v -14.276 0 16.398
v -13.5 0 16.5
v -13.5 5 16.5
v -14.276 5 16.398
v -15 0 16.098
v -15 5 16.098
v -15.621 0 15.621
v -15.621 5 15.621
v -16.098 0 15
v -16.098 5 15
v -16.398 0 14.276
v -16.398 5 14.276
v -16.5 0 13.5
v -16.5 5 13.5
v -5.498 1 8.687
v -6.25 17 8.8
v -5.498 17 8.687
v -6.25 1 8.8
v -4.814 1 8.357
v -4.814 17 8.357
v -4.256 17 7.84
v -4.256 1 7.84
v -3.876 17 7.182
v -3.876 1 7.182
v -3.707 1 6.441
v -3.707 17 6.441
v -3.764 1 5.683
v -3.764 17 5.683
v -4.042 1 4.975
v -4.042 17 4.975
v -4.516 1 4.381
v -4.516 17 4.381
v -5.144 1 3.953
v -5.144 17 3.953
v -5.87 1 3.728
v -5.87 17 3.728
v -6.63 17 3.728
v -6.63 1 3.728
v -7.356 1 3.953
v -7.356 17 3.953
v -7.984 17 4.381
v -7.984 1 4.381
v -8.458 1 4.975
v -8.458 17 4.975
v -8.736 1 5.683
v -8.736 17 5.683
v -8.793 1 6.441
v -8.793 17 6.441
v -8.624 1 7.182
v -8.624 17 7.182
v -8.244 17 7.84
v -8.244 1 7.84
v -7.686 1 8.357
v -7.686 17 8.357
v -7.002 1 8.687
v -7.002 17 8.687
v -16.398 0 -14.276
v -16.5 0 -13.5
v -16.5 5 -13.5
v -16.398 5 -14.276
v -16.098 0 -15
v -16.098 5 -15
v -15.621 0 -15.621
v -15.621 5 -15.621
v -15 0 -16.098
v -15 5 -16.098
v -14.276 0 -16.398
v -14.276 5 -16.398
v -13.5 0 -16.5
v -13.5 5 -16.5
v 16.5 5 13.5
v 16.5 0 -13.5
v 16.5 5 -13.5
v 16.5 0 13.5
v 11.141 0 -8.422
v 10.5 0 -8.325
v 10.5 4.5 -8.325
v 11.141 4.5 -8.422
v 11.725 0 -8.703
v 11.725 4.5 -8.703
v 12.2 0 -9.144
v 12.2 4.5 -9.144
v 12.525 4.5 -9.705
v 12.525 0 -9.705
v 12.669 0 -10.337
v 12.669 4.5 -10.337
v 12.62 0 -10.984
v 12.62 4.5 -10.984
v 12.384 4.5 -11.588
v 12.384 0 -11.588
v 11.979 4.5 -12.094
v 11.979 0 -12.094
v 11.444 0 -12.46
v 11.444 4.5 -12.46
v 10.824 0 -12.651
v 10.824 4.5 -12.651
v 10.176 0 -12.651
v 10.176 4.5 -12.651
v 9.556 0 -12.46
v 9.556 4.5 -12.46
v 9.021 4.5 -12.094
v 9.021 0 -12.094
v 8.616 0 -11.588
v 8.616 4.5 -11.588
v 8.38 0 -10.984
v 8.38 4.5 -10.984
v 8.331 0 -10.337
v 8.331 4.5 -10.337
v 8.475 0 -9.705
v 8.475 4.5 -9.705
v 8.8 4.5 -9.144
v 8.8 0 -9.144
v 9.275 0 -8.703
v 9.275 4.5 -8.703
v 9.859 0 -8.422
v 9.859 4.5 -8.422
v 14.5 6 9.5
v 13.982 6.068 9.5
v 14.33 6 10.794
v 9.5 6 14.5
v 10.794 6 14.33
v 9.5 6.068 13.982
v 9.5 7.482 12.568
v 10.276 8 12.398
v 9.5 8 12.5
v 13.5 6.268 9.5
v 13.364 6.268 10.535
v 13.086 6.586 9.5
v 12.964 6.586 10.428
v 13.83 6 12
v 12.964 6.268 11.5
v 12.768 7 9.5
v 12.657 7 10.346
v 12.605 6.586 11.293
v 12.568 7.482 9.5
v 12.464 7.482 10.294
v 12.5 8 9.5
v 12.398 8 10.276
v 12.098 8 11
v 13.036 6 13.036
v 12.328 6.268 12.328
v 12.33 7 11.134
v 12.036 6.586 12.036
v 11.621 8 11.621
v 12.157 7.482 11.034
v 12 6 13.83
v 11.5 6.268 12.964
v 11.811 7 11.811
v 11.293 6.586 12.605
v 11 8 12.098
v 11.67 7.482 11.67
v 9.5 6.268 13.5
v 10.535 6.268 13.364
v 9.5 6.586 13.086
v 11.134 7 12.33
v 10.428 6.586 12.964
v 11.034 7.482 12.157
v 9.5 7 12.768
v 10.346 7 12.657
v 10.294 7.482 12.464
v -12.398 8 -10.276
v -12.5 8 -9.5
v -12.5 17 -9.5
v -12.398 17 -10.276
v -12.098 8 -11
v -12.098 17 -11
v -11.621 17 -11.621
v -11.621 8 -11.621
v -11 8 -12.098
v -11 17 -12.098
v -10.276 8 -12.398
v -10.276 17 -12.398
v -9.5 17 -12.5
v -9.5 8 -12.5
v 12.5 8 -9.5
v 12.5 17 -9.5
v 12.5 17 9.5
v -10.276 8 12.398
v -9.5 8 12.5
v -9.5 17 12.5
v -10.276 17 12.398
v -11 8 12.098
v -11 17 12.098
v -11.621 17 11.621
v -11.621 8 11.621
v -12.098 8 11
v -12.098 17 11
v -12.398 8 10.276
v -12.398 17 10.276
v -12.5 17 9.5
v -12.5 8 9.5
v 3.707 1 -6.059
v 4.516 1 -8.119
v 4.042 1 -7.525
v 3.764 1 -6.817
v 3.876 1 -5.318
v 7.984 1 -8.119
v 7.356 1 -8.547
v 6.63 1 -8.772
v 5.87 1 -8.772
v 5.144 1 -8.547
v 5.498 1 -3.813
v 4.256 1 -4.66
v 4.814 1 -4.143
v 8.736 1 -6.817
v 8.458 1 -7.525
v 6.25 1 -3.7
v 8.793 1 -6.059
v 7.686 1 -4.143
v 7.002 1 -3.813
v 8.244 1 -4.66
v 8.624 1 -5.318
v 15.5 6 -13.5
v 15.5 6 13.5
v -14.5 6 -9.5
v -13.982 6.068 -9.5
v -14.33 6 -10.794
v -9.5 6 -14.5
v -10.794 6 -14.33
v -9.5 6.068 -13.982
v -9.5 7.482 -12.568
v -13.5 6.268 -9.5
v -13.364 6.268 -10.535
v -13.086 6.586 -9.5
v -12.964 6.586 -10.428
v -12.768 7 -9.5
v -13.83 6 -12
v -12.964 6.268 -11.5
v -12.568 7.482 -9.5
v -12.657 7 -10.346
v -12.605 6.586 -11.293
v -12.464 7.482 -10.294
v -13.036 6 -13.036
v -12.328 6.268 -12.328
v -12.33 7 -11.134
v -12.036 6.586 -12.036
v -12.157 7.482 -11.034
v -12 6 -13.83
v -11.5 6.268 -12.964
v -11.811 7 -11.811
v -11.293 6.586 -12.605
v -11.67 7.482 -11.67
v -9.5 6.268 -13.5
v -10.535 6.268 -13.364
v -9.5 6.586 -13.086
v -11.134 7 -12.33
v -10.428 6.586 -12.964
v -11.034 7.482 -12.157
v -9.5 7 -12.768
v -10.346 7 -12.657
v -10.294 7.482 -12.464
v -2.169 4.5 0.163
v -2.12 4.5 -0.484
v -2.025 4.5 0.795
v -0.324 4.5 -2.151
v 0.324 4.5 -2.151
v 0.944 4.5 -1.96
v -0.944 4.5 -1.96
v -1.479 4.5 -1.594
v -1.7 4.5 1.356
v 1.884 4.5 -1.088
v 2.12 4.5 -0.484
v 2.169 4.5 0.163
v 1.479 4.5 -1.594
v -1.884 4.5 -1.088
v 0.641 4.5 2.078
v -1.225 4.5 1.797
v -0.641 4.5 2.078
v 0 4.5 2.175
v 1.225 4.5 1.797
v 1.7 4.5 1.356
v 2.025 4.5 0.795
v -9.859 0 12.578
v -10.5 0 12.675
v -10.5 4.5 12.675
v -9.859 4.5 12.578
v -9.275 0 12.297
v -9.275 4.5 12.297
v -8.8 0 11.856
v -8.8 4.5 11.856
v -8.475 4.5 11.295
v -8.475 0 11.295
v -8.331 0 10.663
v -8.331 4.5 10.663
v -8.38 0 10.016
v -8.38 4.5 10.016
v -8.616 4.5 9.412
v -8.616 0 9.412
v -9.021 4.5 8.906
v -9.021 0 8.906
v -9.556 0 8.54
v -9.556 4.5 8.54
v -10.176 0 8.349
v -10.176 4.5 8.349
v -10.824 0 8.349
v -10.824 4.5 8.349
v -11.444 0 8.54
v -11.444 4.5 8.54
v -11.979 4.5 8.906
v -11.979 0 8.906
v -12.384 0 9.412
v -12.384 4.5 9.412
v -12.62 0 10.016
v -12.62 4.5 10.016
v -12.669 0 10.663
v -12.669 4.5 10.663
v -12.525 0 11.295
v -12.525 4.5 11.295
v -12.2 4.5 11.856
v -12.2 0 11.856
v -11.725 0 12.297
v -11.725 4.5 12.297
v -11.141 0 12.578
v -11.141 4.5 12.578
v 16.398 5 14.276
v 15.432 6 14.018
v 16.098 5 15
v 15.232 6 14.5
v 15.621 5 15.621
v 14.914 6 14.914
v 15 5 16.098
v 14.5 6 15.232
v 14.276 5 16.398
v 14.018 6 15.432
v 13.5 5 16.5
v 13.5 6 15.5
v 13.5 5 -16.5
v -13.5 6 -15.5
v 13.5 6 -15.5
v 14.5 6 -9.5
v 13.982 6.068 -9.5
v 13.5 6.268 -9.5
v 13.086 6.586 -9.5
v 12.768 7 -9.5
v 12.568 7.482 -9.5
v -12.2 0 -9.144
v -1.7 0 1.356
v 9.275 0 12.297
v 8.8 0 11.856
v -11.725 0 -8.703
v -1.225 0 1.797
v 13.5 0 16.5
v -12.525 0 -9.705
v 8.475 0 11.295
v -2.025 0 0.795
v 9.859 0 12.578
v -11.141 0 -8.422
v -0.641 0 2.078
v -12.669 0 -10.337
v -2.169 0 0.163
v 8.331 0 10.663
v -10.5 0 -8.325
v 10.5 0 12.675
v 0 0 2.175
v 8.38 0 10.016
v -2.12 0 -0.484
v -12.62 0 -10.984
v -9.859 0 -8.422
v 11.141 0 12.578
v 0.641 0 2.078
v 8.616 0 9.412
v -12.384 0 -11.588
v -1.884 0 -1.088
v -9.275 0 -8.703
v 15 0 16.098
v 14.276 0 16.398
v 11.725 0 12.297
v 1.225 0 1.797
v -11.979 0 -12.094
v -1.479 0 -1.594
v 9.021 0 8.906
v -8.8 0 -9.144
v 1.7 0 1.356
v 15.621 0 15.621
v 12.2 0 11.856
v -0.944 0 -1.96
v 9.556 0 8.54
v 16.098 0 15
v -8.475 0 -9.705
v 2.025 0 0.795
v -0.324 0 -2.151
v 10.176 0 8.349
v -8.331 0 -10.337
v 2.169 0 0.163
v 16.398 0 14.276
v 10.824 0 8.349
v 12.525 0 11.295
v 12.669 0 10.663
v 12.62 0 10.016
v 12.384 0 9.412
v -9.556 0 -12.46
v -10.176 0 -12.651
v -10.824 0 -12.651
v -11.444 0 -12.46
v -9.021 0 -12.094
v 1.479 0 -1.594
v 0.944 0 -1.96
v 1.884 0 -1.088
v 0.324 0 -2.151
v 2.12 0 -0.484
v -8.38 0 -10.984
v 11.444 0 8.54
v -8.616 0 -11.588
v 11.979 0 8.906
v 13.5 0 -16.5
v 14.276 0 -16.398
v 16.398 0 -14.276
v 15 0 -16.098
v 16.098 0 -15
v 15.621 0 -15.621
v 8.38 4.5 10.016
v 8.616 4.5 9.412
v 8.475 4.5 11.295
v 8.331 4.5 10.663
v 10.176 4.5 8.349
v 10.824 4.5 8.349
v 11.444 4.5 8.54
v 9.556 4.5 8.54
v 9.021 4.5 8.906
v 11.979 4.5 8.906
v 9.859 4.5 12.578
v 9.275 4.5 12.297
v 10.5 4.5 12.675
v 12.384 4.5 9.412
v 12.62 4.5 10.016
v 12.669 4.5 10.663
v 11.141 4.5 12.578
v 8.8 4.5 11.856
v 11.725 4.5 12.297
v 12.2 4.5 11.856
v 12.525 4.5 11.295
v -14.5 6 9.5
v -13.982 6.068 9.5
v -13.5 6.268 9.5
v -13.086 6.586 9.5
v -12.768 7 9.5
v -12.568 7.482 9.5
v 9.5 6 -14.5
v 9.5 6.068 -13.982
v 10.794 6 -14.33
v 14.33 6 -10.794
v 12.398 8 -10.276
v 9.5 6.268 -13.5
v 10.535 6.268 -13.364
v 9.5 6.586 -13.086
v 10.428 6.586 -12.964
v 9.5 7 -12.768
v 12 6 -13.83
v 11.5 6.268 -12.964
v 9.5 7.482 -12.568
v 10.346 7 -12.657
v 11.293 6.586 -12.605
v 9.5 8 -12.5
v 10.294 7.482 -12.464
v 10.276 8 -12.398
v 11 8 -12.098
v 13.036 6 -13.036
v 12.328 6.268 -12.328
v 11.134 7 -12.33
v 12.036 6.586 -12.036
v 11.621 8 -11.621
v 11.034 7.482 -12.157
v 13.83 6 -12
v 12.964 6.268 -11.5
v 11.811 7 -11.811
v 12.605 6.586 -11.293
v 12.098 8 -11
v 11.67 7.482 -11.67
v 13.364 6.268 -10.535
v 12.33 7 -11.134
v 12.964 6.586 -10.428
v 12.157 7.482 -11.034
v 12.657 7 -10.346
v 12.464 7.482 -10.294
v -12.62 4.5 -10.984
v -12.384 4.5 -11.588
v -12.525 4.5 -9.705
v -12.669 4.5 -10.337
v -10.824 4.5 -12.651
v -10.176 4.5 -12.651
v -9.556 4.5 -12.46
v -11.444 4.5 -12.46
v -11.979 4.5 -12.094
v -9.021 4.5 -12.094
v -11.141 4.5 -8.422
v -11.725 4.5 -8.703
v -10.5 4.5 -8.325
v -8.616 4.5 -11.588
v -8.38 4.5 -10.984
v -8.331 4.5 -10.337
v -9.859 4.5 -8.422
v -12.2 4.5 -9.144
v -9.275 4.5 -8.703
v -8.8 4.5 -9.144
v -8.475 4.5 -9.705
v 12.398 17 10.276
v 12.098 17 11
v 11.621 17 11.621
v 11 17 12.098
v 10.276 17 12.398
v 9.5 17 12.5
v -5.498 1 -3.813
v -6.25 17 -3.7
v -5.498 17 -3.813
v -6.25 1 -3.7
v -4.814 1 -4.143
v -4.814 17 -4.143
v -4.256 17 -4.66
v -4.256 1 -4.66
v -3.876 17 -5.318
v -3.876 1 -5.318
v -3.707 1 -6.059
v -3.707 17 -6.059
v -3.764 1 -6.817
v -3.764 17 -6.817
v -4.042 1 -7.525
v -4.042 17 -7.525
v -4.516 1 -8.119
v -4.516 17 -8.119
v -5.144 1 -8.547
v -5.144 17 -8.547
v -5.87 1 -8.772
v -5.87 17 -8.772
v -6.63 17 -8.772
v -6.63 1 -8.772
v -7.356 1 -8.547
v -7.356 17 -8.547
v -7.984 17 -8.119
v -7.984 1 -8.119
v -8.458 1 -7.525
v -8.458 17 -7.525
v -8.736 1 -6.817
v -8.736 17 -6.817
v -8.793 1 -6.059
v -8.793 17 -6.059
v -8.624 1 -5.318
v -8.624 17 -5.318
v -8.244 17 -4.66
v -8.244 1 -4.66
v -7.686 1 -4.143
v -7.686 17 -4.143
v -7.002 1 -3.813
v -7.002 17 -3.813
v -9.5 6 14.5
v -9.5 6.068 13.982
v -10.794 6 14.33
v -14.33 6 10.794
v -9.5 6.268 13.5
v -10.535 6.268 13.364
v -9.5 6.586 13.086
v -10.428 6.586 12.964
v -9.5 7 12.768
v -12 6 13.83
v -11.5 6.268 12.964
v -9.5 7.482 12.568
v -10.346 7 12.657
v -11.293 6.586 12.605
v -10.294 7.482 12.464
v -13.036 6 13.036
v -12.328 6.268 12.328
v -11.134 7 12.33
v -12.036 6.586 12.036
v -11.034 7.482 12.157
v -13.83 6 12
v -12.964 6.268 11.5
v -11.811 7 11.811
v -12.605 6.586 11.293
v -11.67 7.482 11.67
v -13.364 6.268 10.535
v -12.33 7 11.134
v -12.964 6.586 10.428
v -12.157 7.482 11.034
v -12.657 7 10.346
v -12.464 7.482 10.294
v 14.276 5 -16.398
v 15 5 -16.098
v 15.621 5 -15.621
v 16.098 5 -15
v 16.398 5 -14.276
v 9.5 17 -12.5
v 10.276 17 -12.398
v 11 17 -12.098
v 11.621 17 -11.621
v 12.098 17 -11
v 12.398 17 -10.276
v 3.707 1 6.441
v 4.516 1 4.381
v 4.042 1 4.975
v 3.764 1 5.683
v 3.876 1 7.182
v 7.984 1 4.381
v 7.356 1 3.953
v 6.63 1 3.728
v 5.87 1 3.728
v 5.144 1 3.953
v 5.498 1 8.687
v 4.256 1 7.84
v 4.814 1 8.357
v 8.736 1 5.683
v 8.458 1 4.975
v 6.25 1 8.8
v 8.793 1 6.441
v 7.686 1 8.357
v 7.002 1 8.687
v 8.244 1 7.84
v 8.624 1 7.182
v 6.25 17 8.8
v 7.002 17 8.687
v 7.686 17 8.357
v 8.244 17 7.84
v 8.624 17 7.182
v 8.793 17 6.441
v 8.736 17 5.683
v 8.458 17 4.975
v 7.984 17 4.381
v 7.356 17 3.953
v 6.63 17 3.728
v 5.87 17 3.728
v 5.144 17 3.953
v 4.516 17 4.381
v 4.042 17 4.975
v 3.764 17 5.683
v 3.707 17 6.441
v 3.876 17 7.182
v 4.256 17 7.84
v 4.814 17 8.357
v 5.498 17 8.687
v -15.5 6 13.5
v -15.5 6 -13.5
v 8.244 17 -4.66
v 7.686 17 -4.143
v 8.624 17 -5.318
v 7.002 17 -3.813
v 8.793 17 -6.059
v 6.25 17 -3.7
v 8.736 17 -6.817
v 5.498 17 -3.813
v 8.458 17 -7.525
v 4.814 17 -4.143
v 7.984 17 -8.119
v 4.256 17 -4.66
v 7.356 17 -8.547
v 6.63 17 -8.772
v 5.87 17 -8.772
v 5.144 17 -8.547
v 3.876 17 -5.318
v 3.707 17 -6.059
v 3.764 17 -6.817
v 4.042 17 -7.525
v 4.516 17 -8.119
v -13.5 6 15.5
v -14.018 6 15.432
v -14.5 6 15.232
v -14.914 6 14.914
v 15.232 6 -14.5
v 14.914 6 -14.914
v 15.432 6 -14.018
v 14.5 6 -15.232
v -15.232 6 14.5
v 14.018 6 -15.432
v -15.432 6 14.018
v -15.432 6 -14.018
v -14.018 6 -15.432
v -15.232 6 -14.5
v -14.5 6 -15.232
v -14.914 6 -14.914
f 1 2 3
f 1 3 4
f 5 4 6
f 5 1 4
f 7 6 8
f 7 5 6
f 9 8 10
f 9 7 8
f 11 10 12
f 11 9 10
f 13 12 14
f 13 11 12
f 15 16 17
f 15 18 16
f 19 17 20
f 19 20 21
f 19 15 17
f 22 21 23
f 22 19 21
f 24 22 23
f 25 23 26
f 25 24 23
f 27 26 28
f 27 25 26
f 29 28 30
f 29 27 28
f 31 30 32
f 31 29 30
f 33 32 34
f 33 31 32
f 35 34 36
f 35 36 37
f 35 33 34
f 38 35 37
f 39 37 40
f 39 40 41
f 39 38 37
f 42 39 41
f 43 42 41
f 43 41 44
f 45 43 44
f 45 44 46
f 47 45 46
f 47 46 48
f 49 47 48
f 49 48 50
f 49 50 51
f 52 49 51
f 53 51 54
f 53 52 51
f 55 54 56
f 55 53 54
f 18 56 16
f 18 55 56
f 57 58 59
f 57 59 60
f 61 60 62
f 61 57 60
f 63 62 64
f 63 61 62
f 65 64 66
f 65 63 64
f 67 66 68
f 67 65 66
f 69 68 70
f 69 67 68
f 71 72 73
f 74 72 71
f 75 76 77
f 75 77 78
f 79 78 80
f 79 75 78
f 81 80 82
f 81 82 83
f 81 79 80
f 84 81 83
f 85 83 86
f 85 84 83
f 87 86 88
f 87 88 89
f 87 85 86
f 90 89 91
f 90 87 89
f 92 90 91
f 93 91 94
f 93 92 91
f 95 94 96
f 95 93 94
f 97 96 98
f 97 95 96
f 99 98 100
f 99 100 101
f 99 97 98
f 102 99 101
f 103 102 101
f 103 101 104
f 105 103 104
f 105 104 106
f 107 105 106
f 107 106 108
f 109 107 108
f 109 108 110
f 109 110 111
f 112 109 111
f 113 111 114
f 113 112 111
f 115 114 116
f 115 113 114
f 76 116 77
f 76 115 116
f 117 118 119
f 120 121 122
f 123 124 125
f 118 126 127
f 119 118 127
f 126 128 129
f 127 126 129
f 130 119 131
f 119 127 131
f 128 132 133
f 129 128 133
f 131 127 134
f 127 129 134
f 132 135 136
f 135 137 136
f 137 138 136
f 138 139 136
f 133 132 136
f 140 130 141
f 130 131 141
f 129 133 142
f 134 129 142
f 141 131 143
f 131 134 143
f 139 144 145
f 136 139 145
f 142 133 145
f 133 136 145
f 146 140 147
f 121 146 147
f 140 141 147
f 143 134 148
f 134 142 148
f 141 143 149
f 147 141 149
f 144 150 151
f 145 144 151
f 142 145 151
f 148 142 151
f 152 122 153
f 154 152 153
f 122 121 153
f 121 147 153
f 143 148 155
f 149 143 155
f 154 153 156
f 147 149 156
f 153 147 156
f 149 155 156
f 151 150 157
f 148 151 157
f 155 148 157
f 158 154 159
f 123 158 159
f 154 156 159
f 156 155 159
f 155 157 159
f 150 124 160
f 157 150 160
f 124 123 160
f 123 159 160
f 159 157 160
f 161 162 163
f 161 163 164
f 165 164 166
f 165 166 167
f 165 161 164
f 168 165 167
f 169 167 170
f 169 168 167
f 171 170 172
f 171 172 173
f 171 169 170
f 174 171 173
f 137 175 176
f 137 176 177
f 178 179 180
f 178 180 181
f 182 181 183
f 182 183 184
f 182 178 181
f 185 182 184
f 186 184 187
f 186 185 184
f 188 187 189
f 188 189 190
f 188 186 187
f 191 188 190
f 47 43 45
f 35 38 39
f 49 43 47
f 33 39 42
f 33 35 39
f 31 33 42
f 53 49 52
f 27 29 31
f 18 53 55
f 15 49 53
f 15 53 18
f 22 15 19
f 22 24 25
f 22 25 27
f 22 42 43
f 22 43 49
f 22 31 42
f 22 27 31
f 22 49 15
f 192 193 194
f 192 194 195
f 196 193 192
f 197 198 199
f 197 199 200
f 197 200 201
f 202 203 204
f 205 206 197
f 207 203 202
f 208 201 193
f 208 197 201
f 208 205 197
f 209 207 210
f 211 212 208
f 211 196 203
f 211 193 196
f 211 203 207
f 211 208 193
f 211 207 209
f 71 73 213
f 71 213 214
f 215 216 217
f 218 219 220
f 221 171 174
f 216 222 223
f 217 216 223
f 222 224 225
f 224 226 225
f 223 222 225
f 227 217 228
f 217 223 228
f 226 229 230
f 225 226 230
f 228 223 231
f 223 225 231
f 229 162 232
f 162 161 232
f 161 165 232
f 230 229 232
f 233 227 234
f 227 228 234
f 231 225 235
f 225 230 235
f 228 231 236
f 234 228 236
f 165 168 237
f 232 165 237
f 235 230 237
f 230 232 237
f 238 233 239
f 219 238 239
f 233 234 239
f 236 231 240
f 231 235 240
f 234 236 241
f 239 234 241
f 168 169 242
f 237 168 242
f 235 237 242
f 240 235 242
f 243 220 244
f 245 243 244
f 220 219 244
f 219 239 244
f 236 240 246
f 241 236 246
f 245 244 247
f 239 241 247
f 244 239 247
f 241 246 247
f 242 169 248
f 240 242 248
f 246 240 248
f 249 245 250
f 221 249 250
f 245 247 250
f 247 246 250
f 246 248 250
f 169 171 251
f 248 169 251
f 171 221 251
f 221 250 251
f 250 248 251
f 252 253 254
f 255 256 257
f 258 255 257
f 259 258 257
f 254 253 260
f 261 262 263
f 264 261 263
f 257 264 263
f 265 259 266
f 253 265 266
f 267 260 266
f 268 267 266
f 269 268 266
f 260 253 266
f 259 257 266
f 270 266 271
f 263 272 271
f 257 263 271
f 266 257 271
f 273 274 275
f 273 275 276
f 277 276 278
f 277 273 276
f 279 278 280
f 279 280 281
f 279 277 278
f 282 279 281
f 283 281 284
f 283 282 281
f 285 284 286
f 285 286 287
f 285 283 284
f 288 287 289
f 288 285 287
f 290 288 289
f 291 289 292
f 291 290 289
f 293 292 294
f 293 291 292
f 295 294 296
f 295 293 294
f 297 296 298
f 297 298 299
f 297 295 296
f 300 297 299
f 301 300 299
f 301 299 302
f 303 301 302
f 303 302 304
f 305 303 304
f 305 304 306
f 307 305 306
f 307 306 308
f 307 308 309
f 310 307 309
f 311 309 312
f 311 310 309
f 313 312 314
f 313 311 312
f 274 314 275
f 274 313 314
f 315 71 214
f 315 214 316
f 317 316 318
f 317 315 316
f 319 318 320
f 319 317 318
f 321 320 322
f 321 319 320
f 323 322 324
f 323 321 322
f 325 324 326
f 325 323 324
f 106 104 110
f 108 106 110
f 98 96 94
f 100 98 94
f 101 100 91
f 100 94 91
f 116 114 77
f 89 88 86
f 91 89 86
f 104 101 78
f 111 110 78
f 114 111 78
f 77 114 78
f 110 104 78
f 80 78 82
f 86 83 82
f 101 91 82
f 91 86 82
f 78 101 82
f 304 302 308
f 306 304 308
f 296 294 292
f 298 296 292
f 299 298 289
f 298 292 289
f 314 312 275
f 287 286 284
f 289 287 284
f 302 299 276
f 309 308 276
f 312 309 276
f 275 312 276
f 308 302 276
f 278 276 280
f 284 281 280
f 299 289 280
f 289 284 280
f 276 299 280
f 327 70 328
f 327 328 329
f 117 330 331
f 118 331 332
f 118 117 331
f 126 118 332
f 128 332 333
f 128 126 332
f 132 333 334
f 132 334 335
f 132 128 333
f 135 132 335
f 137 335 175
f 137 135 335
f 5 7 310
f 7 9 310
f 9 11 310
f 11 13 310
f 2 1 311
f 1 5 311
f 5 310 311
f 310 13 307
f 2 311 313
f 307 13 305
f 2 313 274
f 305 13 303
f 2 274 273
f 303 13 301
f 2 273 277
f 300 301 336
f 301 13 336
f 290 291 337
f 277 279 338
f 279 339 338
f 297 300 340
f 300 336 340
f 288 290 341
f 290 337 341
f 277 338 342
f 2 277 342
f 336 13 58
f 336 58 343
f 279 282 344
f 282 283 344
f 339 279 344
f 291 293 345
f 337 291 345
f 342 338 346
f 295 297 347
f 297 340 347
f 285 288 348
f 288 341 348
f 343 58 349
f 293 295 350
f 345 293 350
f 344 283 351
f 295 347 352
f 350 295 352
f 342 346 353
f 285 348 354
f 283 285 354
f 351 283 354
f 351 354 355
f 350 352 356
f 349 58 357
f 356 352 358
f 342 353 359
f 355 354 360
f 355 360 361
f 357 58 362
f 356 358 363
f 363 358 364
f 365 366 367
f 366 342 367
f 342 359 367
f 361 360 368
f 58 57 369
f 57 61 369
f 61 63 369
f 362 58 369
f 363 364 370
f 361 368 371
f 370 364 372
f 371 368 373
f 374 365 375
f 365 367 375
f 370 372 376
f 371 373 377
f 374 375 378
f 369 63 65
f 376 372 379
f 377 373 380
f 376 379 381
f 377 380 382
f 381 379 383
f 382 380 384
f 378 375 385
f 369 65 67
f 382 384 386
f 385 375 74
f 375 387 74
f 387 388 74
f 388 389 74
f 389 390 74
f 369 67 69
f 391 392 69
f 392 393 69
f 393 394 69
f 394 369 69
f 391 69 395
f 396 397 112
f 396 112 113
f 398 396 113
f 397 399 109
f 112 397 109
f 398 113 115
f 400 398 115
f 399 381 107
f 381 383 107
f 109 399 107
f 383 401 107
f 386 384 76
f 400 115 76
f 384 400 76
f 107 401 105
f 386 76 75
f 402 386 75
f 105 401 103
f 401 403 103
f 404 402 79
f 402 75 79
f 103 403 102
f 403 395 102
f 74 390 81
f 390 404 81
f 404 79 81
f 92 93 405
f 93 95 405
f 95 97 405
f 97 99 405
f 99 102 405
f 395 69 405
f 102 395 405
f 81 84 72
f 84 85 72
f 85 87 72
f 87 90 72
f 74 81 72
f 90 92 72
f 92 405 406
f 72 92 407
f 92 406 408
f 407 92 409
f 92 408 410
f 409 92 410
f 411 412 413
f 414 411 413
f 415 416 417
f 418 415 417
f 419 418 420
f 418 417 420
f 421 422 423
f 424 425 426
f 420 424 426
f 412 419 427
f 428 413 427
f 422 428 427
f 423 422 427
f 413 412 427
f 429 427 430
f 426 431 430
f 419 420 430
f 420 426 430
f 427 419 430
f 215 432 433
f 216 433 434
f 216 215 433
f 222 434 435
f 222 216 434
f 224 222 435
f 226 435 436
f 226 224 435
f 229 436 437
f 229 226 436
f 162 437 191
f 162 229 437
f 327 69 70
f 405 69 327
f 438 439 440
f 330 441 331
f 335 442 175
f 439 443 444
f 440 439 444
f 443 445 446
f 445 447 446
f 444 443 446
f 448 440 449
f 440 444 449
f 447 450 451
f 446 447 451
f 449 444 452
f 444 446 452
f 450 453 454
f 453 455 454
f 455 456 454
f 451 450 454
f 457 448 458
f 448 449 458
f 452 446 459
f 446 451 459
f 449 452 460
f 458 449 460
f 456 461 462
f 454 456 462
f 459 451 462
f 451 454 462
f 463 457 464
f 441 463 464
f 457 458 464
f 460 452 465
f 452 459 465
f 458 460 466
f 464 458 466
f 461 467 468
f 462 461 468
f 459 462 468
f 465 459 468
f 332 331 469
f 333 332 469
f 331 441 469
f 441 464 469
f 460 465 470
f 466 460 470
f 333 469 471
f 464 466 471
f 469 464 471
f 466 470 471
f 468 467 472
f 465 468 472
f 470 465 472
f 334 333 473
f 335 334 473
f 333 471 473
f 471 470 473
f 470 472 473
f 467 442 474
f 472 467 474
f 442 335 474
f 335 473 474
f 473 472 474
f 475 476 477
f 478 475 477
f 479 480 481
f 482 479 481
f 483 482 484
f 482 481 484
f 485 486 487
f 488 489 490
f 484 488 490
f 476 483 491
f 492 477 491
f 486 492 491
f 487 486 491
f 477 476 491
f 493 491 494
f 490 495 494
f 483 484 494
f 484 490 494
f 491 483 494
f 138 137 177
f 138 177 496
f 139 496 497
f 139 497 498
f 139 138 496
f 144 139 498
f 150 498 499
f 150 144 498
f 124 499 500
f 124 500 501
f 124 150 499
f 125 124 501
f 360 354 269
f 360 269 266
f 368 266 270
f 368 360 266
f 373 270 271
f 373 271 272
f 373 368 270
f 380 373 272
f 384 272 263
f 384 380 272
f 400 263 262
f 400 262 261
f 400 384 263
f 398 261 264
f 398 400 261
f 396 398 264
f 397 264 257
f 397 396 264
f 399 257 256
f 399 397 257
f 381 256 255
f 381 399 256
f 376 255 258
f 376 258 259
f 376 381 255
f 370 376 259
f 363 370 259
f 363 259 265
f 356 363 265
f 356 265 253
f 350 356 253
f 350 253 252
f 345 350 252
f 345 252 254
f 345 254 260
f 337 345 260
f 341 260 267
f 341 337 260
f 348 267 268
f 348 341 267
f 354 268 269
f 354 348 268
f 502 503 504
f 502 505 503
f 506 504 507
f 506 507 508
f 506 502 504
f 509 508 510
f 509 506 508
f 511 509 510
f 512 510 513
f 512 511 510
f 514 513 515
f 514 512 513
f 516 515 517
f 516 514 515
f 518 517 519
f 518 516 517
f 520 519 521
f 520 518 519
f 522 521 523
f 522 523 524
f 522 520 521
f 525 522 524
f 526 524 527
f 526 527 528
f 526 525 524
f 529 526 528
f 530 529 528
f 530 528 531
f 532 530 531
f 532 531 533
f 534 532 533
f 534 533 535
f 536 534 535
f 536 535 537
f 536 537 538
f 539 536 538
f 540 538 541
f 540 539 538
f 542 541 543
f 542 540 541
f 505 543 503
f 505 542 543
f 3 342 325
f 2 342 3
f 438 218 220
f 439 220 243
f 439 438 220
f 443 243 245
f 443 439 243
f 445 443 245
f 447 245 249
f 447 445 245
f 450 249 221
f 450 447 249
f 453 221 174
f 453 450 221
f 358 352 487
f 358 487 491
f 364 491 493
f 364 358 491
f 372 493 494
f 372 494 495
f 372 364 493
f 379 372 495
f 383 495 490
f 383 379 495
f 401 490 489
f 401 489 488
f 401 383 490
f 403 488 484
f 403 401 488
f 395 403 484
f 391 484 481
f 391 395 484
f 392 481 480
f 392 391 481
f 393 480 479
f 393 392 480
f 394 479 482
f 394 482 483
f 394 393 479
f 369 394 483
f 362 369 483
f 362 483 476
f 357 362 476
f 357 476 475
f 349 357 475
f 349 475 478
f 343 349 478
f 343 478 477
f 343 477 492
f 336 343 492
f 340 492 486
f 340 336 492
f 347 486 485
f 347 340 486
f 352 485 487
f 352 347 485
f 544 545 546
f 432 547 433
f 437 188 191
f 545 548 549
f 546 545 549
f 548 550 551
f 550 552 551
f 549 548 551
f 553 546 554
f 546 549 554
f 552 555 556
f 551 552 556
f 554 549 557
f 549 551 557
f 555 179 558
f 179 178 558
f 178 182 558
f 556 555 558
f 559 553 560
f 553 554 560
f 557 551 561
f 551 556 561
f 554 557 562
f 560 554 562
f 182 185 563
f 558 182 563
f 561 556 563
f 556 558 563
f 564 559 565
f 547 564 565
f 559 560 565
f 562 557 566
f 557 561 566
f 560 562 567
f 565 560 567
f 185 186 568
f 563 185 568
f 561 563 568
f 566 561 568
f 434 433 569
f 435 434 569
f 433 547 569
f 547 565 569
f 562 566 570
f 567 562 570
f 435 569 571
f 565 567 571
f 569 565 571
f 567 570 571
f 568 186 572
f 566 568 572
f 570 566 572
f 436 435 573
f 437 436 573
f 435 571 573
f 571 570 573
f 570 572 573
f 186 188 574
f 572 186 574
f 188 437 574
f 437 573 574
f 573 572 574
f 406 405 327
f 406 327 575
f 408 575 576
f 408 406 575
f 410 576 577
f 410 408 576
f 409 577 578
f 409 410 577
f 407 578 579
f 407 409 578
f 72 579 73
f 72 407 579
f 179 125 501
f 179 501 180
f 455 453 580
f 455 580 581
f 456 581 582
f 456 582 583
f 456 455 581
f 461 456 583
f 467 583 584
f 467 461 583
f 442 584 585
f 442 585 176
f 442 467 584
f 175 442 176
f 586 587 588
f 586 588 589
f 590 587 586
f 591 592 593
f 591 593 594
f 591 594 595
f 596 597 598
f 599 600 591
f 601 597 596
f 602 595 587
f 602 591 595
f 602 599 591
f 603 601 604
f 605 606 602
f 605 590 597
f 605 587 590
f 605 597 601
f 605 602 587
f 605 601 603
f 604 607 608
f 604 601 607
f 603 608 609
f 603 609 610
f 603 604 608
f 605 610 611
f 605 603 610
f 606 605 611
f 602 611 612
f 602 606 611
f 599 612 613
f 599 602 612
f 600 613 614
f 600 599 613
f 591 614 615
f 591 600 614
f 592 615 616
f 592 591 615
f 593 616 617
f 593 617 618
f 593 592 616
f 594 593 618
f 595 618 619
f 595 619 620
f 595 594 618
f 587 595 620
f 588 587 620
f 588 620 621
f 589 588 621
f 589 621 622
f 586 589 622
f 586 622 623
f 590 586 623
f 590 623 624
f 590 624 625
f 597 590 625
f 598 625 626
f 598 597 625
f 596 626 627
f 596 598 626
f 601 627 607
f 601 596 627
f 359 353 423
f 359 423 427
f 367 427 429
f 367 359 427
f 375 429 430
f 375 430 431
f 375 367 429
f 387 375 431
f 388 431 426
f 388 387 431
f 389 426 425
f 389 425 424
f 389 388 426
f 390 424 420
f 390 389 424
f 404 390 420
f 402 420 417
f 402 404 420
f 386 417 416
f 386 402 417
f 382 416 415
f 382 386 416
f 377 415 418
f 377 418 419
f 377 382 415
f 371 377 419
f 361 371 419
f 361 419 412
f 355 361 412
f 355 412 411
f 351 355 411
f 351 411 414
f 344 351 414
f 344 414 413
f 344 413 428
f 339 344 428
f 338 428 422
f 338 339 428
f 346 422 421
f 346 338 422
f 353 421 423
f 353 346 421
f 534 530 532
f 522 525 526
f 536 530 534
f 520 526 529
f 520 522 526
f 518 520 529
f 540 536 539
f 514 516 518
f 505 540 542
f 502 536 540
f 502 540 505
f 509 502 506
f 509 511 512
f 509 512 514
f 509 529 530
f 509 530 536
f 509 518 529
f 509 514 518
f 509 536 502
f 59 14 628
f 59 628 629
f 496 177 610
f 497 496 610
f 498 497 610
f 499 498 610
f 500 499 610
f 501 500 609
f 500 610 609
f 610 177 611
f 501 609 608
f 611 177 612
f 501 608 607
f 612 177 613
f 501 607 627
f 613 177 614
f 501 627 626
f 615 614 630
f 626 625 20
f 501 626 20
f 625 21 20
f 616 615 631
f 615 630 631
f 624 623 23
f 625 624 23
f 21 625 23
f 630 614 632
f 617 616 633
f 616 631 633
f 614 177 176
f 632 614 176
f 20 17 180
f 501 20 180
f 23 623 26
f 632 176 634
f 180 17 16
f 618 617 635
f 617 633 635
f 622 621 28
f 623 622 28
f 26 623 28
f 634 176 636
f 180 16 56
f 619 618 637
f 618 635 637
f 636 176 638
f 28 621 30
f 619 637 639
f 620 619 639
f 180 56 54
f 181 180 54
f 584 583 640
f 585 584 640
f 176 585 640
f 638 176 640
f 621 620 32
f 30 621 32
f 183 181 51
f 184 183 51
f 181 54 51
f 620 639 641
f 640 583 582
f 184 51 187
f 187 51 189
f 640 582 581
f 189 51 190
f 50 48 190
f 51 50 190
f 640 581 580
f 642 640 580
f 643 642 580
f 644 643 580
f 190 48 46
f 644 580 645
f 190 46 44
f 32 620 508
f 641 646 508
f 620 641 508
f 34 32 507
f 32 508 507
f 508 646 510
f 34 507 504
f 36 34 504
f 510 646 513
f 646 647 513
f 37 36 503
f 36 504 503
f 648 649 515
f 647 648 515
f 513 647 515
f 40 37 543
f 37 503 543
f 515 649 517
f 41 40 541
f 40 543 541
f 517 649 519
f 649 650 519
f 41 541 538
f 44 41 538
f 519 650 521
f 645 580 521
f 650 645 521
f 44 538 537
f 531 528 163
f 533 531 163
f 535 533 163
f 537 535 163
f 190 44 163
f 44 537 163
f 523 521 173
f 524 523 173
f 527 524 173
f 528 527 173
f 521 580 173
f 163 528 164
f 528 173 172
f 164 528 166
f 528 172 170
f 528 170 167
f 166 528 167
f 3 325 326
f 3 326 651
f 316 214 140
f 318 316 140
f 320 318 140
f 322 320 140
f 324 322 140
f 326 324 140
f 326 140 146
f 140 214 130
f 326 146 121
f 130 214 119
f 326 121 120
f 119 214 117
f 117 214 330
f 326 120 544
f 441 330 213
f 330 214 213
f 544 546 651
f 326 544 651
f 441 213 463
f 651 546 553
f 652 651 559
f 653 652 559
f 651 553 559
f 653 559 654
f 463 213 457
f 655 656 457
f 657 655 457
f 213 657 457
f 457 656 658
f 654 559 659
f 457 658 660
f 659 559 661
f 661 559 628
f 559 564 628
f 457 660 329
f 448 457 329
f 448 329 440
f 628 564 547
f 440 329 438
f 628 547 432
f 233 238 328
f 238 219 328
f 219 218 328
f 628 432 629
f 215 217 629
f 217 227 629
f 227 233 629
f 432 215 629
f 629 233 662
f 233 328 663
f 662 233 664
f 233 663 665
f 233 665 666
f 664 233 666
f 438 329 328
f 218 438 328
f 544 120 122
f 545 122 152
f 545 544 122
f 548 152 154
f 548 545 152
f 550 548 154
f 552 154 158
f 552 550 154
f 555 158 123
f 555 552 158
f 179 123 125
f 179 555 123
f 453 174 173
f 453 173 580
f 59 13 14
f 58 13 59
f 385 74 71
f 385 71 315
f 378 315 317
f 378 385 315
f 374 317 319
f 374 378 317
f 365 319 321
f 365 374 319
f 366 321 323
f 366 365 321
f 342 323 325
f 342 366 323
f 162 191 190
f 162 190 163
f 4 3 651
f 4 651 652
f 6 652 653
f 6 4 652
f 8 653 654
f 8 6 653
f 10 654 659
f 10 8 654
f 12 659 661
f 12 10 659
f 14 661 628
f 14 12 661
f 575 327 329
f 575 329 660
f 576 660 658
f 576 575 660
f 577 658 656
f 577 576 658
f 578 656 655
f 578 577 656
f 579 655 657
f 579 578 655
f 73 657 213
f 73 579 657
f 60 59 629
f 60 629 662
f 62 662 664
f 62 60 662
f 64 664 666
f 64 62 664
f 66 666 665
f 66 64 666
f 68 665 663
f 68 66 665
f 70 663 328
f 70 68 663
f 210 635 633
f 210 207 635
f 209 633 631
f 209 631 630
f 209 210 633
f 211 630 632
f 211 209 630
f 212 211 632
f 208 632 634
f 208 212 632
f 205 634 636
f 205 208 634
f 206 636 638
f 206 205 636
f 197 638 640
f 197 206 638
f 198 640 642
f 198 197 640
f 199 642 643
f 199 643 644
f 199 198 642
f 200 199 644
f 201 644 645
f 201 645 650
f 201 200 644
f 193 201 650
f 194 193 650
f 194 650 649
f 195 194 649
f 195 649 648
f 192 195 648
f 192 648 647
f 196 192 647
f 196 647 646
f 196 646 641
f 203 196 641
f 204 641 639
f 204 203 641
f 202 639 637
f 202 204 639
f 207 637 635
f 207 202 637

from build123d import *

# Parameters (mm, degrees)
SKETCH_1_R          = 2.175
EXTRUDE_4_DEPTH     = 6
SKETCH_1_3_R        = 2.175
CUT_EXTRUDE_3_DEPTH = 4.5
SKETCH_8_R          = 2.55
EXTRUDE_5_DEPTH     = 11
FILLET_1_R          = 2
CUT_EXTRUDE_START   = -5
SKETCH_8_2_R        = 2.55
CUT_EXTRUDE_4_DEPTH = 5
CHAMFER_1_SIZE      = 1


with BuildPart() as part:
    # 草图1 → 凸台-拉伸4 (new body)
    # profile 1 of 6: a face of its own
    with BuildSketch(Plane(origin=(0, 0, 0), x_dir=(1, 0, 0), z_dir=(0, 1, 0))):
        with BuildLine():
            Line((-13.5, 16.5), (13.5, 16.5))
            ThreePointArc((13.5, 16.5), (15.621320344, 15.621320344), (16.5, 13.5))
            Line((16.5, 13.5), (16.5, -13.5))
            ThreePointArc((16.5, -13.5), (15.621320344, -15.621320344), (13.5, -16.5))
            Line((13.5, -16.5), (-13.5, -16.5))
            ThreePointArc((-13.5, -16.5), (-15.621320344, -15.621320344), (-16.5, -13.5))
            Line((-16.5, -13.5), (-16.5, 13.5))
            ThreePointArc((-16.5, 13.5), (-15.621320344, 15.621320344), (-13.5, 16.5))
        make_face()
        with Locations((-10.5, 10.5)):
            Circle(SKETCH_1_R, mode=Mode.SUBTRACT)
        with Locations((10.5, 10.5)):
            Circle(SKETCH_1_R, mode=Mode.SUBTRACT)
        with Locations((10.5, -10.5)):
            Circle(SKETCH_1_R, mode=Mode.SUBTRACT)
        with Locations((-10.5, -10.5)):
            Circle(SKETCH_1_R, mode=Mode.SUBTRACT)
        Circle(SKETCH_1_R, mode=Mode.SUBTRACT)
    # profile 2 of 6: a face of its own
    with BuildSketch(Plane(origin=(0, 0, 0), x_dir=(1, 0, 0), z_dir=(0, 1, 0))):
        with Locations((10.5, -10.5)):
            Circle(SKETCH_1_R)
    # profile 3 of 6: a face of its own
    with BuildSketch(Plane(origin=(0, 0, 0), x_dir=(1, 0, 0), z_dir=(0, 1, 0))):
        with Locations((10.5, 10.5)):
            Circle(SKETCH_1_R)
    # profile 4 of 6: a face of its own
    with BuildSketch(Plane(origin=(0, 0, 0), x_dir=(1, 0, 0), z_dir=(0, 1, 0))):
        with Locations((-10.5, 10.5)):
            Circle(SKETCH_1_R)
    # profile 5 of 6: a face of its own
    with BuildSketch(Plane(origin=(0, 0, 0), x_dir=(1, 0, 0), z_dir=(0, 1, 0))):
        Circle(SKETCH_1_R)
    # profile 6 of 6: a face of its own
    with BuildSketch(Plane(origin=(0, 0, 0), x_dir=(1, 0, 0), z_dir=(0, 1, 0))):
        with Locations((-10.5, -10.5)):
            Circle(SKETCH_1_R)
    extrude(amount=EXTRUDE_4_DEPTH)

    # 草图1<3> → 切除-拉伸3 (cut)
    with BuildSketch(Plane(origin=(0, 0, 0), x_dir=(1, 0, 0), z_dir=(0, 1, 0))):
        with Locations(Location((10.5, -10.5, 0), (0, 0, 270))):
            Circle(SKETCH_1_3_R)
        with Locations(Location((10.5, 10.5, 0), (0, 0, 270))):
            Circle(SKETCH_1_3_R)
        with Locations(Location((-10.5, 10.5, 0), (0, 0, 270))):
            Circle(SKETCH_1_3_R)
        with Locations(Location((-10.5, -10.5, 0), (0, 0, 270))):
            Circle(SKETCH_1_3_R)
        with Locations(Location((0, 0, 0), (0, 0, 270))):
            Circle(SKETCH_1_3_R)
    extrude(amount=CUT_EXTRUDE_3_DEPTH, mode=Mode.SUBTRACT)

    # 草图8 → 凸台-拉伸5 (add)
    with BuildSketch(Plane(origin=(0, 6, 0), x_dir=(1, 0, 0), z_dir=(0, 1, 0))):
        with BuildLine():
            Line((-9.5, 12.5), (9.5, 12.5))
            ThreePointArc((9.5, 12.5), (11.621320344, 11.621320344), (12.5, 9.5))
            Line((12.5, 9.5), (12.5, -9.5))
            ThreePointArc((12.5, -9.5), (11.621320344, -11.621320344), (9.5, -12.5))
            Line((9.5, -12.5), (-9.5, -12.5))
            ThreePointArc((-9.5, -12.5), (-11.621320344, -11.621320344), (-12.5, -9.5))
            Line((-12.5, -9.5), (-12.5, 9.5))
            ThreePointArc((-12.5, 9.5), (-11.621320344, 11.621320344), (-9.5, 12.5))
        make_face()
        with Locations(Location((-6.25, 6.25, 0), (0, 0, 270))):
            Circle(SKETCH_8_R, mode=Mode.SUBTRACT)
        with Locations(Location((6.25, 6.25, 0), (0, 0, 270))):
            Circle(SKETCH_8_R, mode=Mode.SUBTRACT)
        with Locations(Location((-6.25, -6.25, 0), (0, 0, 270))):
            Circle(SKETCH_8_R, mode=Mode.SUBTRACT)
        with Locations(Location((6.25, -6.25, 0), (0, 0, 270))):
            Circle(SKETCH_8_R, mode=Mode.SUBTRACT)
    extrude(amount=EXTRUDE_5_DEPTH)

    # 圆角1
    fillet_1_edges = [part.edges().sort_by_distance(p)[0] for p in [
        (11.621320344, 6, 11.621320344),
        (12.5, 6, 0),
        (11.621320344, 6, -11.621320344),
        (0, 6, -12.5),
        (-11.621320344, 6, -11.621320344),
        (-12.5, 6, 0),
        (-11.621320344, 6, 11.621320344),
        (0, 6, 12.5),
    ]]
    fillet(fillet_1_edges, radius=FILLET_1_R)

    # 草图8<2> → 切除-拉伸4 (cut)
    with BuildSketch(Plane(origin=(0, 6, 0), x_dir=(1, 0, 0), z_dir=(0, 1, 0)).offset(CUT_EXTRUDE_START)):
        with Locations(Location((-6.25, 6.25, 0), (0, 0, 270))):
            Circle(SKETCH_8_2_R)
        with Locations(Location((6.25, 6.25, 0), (0, 0, 270))):
            Circle(SKETCH_8_2_R)
        with Locations(Location((6.25, -6.25, 0), (0, 0, 270))):
            Circle(SKETCH_8_2_R)
        with Locations(Location((-6.25, -6.25, 0), (0, 0, 270))):
            Circle(SKETCH_8_2_R)
    extrude(amount=CUT_EXTRUDE_4_DEPTH, mode=Mode.SUBTRACT)

    # 倒角1
    chamfer_1_edges = [part.edges().sort_by_distance(p)[0] for p in [
        (-16.5, 6, 0),
        (-15.621320344, 6, 15.621320344),
        (0, 6, 16.5),
        (15.621320344, 6, 15.621320344),
        (16.5, 6, 0),
        (15.621320344, 6, -15.621320344),
        (0, 6, -16.5),
        (-15.621320344, 6, -15.621320344),
    ]]
    chamfer(chamfer_1_edges, length=CHAMFER_1_SIZE)


solid = part.part
